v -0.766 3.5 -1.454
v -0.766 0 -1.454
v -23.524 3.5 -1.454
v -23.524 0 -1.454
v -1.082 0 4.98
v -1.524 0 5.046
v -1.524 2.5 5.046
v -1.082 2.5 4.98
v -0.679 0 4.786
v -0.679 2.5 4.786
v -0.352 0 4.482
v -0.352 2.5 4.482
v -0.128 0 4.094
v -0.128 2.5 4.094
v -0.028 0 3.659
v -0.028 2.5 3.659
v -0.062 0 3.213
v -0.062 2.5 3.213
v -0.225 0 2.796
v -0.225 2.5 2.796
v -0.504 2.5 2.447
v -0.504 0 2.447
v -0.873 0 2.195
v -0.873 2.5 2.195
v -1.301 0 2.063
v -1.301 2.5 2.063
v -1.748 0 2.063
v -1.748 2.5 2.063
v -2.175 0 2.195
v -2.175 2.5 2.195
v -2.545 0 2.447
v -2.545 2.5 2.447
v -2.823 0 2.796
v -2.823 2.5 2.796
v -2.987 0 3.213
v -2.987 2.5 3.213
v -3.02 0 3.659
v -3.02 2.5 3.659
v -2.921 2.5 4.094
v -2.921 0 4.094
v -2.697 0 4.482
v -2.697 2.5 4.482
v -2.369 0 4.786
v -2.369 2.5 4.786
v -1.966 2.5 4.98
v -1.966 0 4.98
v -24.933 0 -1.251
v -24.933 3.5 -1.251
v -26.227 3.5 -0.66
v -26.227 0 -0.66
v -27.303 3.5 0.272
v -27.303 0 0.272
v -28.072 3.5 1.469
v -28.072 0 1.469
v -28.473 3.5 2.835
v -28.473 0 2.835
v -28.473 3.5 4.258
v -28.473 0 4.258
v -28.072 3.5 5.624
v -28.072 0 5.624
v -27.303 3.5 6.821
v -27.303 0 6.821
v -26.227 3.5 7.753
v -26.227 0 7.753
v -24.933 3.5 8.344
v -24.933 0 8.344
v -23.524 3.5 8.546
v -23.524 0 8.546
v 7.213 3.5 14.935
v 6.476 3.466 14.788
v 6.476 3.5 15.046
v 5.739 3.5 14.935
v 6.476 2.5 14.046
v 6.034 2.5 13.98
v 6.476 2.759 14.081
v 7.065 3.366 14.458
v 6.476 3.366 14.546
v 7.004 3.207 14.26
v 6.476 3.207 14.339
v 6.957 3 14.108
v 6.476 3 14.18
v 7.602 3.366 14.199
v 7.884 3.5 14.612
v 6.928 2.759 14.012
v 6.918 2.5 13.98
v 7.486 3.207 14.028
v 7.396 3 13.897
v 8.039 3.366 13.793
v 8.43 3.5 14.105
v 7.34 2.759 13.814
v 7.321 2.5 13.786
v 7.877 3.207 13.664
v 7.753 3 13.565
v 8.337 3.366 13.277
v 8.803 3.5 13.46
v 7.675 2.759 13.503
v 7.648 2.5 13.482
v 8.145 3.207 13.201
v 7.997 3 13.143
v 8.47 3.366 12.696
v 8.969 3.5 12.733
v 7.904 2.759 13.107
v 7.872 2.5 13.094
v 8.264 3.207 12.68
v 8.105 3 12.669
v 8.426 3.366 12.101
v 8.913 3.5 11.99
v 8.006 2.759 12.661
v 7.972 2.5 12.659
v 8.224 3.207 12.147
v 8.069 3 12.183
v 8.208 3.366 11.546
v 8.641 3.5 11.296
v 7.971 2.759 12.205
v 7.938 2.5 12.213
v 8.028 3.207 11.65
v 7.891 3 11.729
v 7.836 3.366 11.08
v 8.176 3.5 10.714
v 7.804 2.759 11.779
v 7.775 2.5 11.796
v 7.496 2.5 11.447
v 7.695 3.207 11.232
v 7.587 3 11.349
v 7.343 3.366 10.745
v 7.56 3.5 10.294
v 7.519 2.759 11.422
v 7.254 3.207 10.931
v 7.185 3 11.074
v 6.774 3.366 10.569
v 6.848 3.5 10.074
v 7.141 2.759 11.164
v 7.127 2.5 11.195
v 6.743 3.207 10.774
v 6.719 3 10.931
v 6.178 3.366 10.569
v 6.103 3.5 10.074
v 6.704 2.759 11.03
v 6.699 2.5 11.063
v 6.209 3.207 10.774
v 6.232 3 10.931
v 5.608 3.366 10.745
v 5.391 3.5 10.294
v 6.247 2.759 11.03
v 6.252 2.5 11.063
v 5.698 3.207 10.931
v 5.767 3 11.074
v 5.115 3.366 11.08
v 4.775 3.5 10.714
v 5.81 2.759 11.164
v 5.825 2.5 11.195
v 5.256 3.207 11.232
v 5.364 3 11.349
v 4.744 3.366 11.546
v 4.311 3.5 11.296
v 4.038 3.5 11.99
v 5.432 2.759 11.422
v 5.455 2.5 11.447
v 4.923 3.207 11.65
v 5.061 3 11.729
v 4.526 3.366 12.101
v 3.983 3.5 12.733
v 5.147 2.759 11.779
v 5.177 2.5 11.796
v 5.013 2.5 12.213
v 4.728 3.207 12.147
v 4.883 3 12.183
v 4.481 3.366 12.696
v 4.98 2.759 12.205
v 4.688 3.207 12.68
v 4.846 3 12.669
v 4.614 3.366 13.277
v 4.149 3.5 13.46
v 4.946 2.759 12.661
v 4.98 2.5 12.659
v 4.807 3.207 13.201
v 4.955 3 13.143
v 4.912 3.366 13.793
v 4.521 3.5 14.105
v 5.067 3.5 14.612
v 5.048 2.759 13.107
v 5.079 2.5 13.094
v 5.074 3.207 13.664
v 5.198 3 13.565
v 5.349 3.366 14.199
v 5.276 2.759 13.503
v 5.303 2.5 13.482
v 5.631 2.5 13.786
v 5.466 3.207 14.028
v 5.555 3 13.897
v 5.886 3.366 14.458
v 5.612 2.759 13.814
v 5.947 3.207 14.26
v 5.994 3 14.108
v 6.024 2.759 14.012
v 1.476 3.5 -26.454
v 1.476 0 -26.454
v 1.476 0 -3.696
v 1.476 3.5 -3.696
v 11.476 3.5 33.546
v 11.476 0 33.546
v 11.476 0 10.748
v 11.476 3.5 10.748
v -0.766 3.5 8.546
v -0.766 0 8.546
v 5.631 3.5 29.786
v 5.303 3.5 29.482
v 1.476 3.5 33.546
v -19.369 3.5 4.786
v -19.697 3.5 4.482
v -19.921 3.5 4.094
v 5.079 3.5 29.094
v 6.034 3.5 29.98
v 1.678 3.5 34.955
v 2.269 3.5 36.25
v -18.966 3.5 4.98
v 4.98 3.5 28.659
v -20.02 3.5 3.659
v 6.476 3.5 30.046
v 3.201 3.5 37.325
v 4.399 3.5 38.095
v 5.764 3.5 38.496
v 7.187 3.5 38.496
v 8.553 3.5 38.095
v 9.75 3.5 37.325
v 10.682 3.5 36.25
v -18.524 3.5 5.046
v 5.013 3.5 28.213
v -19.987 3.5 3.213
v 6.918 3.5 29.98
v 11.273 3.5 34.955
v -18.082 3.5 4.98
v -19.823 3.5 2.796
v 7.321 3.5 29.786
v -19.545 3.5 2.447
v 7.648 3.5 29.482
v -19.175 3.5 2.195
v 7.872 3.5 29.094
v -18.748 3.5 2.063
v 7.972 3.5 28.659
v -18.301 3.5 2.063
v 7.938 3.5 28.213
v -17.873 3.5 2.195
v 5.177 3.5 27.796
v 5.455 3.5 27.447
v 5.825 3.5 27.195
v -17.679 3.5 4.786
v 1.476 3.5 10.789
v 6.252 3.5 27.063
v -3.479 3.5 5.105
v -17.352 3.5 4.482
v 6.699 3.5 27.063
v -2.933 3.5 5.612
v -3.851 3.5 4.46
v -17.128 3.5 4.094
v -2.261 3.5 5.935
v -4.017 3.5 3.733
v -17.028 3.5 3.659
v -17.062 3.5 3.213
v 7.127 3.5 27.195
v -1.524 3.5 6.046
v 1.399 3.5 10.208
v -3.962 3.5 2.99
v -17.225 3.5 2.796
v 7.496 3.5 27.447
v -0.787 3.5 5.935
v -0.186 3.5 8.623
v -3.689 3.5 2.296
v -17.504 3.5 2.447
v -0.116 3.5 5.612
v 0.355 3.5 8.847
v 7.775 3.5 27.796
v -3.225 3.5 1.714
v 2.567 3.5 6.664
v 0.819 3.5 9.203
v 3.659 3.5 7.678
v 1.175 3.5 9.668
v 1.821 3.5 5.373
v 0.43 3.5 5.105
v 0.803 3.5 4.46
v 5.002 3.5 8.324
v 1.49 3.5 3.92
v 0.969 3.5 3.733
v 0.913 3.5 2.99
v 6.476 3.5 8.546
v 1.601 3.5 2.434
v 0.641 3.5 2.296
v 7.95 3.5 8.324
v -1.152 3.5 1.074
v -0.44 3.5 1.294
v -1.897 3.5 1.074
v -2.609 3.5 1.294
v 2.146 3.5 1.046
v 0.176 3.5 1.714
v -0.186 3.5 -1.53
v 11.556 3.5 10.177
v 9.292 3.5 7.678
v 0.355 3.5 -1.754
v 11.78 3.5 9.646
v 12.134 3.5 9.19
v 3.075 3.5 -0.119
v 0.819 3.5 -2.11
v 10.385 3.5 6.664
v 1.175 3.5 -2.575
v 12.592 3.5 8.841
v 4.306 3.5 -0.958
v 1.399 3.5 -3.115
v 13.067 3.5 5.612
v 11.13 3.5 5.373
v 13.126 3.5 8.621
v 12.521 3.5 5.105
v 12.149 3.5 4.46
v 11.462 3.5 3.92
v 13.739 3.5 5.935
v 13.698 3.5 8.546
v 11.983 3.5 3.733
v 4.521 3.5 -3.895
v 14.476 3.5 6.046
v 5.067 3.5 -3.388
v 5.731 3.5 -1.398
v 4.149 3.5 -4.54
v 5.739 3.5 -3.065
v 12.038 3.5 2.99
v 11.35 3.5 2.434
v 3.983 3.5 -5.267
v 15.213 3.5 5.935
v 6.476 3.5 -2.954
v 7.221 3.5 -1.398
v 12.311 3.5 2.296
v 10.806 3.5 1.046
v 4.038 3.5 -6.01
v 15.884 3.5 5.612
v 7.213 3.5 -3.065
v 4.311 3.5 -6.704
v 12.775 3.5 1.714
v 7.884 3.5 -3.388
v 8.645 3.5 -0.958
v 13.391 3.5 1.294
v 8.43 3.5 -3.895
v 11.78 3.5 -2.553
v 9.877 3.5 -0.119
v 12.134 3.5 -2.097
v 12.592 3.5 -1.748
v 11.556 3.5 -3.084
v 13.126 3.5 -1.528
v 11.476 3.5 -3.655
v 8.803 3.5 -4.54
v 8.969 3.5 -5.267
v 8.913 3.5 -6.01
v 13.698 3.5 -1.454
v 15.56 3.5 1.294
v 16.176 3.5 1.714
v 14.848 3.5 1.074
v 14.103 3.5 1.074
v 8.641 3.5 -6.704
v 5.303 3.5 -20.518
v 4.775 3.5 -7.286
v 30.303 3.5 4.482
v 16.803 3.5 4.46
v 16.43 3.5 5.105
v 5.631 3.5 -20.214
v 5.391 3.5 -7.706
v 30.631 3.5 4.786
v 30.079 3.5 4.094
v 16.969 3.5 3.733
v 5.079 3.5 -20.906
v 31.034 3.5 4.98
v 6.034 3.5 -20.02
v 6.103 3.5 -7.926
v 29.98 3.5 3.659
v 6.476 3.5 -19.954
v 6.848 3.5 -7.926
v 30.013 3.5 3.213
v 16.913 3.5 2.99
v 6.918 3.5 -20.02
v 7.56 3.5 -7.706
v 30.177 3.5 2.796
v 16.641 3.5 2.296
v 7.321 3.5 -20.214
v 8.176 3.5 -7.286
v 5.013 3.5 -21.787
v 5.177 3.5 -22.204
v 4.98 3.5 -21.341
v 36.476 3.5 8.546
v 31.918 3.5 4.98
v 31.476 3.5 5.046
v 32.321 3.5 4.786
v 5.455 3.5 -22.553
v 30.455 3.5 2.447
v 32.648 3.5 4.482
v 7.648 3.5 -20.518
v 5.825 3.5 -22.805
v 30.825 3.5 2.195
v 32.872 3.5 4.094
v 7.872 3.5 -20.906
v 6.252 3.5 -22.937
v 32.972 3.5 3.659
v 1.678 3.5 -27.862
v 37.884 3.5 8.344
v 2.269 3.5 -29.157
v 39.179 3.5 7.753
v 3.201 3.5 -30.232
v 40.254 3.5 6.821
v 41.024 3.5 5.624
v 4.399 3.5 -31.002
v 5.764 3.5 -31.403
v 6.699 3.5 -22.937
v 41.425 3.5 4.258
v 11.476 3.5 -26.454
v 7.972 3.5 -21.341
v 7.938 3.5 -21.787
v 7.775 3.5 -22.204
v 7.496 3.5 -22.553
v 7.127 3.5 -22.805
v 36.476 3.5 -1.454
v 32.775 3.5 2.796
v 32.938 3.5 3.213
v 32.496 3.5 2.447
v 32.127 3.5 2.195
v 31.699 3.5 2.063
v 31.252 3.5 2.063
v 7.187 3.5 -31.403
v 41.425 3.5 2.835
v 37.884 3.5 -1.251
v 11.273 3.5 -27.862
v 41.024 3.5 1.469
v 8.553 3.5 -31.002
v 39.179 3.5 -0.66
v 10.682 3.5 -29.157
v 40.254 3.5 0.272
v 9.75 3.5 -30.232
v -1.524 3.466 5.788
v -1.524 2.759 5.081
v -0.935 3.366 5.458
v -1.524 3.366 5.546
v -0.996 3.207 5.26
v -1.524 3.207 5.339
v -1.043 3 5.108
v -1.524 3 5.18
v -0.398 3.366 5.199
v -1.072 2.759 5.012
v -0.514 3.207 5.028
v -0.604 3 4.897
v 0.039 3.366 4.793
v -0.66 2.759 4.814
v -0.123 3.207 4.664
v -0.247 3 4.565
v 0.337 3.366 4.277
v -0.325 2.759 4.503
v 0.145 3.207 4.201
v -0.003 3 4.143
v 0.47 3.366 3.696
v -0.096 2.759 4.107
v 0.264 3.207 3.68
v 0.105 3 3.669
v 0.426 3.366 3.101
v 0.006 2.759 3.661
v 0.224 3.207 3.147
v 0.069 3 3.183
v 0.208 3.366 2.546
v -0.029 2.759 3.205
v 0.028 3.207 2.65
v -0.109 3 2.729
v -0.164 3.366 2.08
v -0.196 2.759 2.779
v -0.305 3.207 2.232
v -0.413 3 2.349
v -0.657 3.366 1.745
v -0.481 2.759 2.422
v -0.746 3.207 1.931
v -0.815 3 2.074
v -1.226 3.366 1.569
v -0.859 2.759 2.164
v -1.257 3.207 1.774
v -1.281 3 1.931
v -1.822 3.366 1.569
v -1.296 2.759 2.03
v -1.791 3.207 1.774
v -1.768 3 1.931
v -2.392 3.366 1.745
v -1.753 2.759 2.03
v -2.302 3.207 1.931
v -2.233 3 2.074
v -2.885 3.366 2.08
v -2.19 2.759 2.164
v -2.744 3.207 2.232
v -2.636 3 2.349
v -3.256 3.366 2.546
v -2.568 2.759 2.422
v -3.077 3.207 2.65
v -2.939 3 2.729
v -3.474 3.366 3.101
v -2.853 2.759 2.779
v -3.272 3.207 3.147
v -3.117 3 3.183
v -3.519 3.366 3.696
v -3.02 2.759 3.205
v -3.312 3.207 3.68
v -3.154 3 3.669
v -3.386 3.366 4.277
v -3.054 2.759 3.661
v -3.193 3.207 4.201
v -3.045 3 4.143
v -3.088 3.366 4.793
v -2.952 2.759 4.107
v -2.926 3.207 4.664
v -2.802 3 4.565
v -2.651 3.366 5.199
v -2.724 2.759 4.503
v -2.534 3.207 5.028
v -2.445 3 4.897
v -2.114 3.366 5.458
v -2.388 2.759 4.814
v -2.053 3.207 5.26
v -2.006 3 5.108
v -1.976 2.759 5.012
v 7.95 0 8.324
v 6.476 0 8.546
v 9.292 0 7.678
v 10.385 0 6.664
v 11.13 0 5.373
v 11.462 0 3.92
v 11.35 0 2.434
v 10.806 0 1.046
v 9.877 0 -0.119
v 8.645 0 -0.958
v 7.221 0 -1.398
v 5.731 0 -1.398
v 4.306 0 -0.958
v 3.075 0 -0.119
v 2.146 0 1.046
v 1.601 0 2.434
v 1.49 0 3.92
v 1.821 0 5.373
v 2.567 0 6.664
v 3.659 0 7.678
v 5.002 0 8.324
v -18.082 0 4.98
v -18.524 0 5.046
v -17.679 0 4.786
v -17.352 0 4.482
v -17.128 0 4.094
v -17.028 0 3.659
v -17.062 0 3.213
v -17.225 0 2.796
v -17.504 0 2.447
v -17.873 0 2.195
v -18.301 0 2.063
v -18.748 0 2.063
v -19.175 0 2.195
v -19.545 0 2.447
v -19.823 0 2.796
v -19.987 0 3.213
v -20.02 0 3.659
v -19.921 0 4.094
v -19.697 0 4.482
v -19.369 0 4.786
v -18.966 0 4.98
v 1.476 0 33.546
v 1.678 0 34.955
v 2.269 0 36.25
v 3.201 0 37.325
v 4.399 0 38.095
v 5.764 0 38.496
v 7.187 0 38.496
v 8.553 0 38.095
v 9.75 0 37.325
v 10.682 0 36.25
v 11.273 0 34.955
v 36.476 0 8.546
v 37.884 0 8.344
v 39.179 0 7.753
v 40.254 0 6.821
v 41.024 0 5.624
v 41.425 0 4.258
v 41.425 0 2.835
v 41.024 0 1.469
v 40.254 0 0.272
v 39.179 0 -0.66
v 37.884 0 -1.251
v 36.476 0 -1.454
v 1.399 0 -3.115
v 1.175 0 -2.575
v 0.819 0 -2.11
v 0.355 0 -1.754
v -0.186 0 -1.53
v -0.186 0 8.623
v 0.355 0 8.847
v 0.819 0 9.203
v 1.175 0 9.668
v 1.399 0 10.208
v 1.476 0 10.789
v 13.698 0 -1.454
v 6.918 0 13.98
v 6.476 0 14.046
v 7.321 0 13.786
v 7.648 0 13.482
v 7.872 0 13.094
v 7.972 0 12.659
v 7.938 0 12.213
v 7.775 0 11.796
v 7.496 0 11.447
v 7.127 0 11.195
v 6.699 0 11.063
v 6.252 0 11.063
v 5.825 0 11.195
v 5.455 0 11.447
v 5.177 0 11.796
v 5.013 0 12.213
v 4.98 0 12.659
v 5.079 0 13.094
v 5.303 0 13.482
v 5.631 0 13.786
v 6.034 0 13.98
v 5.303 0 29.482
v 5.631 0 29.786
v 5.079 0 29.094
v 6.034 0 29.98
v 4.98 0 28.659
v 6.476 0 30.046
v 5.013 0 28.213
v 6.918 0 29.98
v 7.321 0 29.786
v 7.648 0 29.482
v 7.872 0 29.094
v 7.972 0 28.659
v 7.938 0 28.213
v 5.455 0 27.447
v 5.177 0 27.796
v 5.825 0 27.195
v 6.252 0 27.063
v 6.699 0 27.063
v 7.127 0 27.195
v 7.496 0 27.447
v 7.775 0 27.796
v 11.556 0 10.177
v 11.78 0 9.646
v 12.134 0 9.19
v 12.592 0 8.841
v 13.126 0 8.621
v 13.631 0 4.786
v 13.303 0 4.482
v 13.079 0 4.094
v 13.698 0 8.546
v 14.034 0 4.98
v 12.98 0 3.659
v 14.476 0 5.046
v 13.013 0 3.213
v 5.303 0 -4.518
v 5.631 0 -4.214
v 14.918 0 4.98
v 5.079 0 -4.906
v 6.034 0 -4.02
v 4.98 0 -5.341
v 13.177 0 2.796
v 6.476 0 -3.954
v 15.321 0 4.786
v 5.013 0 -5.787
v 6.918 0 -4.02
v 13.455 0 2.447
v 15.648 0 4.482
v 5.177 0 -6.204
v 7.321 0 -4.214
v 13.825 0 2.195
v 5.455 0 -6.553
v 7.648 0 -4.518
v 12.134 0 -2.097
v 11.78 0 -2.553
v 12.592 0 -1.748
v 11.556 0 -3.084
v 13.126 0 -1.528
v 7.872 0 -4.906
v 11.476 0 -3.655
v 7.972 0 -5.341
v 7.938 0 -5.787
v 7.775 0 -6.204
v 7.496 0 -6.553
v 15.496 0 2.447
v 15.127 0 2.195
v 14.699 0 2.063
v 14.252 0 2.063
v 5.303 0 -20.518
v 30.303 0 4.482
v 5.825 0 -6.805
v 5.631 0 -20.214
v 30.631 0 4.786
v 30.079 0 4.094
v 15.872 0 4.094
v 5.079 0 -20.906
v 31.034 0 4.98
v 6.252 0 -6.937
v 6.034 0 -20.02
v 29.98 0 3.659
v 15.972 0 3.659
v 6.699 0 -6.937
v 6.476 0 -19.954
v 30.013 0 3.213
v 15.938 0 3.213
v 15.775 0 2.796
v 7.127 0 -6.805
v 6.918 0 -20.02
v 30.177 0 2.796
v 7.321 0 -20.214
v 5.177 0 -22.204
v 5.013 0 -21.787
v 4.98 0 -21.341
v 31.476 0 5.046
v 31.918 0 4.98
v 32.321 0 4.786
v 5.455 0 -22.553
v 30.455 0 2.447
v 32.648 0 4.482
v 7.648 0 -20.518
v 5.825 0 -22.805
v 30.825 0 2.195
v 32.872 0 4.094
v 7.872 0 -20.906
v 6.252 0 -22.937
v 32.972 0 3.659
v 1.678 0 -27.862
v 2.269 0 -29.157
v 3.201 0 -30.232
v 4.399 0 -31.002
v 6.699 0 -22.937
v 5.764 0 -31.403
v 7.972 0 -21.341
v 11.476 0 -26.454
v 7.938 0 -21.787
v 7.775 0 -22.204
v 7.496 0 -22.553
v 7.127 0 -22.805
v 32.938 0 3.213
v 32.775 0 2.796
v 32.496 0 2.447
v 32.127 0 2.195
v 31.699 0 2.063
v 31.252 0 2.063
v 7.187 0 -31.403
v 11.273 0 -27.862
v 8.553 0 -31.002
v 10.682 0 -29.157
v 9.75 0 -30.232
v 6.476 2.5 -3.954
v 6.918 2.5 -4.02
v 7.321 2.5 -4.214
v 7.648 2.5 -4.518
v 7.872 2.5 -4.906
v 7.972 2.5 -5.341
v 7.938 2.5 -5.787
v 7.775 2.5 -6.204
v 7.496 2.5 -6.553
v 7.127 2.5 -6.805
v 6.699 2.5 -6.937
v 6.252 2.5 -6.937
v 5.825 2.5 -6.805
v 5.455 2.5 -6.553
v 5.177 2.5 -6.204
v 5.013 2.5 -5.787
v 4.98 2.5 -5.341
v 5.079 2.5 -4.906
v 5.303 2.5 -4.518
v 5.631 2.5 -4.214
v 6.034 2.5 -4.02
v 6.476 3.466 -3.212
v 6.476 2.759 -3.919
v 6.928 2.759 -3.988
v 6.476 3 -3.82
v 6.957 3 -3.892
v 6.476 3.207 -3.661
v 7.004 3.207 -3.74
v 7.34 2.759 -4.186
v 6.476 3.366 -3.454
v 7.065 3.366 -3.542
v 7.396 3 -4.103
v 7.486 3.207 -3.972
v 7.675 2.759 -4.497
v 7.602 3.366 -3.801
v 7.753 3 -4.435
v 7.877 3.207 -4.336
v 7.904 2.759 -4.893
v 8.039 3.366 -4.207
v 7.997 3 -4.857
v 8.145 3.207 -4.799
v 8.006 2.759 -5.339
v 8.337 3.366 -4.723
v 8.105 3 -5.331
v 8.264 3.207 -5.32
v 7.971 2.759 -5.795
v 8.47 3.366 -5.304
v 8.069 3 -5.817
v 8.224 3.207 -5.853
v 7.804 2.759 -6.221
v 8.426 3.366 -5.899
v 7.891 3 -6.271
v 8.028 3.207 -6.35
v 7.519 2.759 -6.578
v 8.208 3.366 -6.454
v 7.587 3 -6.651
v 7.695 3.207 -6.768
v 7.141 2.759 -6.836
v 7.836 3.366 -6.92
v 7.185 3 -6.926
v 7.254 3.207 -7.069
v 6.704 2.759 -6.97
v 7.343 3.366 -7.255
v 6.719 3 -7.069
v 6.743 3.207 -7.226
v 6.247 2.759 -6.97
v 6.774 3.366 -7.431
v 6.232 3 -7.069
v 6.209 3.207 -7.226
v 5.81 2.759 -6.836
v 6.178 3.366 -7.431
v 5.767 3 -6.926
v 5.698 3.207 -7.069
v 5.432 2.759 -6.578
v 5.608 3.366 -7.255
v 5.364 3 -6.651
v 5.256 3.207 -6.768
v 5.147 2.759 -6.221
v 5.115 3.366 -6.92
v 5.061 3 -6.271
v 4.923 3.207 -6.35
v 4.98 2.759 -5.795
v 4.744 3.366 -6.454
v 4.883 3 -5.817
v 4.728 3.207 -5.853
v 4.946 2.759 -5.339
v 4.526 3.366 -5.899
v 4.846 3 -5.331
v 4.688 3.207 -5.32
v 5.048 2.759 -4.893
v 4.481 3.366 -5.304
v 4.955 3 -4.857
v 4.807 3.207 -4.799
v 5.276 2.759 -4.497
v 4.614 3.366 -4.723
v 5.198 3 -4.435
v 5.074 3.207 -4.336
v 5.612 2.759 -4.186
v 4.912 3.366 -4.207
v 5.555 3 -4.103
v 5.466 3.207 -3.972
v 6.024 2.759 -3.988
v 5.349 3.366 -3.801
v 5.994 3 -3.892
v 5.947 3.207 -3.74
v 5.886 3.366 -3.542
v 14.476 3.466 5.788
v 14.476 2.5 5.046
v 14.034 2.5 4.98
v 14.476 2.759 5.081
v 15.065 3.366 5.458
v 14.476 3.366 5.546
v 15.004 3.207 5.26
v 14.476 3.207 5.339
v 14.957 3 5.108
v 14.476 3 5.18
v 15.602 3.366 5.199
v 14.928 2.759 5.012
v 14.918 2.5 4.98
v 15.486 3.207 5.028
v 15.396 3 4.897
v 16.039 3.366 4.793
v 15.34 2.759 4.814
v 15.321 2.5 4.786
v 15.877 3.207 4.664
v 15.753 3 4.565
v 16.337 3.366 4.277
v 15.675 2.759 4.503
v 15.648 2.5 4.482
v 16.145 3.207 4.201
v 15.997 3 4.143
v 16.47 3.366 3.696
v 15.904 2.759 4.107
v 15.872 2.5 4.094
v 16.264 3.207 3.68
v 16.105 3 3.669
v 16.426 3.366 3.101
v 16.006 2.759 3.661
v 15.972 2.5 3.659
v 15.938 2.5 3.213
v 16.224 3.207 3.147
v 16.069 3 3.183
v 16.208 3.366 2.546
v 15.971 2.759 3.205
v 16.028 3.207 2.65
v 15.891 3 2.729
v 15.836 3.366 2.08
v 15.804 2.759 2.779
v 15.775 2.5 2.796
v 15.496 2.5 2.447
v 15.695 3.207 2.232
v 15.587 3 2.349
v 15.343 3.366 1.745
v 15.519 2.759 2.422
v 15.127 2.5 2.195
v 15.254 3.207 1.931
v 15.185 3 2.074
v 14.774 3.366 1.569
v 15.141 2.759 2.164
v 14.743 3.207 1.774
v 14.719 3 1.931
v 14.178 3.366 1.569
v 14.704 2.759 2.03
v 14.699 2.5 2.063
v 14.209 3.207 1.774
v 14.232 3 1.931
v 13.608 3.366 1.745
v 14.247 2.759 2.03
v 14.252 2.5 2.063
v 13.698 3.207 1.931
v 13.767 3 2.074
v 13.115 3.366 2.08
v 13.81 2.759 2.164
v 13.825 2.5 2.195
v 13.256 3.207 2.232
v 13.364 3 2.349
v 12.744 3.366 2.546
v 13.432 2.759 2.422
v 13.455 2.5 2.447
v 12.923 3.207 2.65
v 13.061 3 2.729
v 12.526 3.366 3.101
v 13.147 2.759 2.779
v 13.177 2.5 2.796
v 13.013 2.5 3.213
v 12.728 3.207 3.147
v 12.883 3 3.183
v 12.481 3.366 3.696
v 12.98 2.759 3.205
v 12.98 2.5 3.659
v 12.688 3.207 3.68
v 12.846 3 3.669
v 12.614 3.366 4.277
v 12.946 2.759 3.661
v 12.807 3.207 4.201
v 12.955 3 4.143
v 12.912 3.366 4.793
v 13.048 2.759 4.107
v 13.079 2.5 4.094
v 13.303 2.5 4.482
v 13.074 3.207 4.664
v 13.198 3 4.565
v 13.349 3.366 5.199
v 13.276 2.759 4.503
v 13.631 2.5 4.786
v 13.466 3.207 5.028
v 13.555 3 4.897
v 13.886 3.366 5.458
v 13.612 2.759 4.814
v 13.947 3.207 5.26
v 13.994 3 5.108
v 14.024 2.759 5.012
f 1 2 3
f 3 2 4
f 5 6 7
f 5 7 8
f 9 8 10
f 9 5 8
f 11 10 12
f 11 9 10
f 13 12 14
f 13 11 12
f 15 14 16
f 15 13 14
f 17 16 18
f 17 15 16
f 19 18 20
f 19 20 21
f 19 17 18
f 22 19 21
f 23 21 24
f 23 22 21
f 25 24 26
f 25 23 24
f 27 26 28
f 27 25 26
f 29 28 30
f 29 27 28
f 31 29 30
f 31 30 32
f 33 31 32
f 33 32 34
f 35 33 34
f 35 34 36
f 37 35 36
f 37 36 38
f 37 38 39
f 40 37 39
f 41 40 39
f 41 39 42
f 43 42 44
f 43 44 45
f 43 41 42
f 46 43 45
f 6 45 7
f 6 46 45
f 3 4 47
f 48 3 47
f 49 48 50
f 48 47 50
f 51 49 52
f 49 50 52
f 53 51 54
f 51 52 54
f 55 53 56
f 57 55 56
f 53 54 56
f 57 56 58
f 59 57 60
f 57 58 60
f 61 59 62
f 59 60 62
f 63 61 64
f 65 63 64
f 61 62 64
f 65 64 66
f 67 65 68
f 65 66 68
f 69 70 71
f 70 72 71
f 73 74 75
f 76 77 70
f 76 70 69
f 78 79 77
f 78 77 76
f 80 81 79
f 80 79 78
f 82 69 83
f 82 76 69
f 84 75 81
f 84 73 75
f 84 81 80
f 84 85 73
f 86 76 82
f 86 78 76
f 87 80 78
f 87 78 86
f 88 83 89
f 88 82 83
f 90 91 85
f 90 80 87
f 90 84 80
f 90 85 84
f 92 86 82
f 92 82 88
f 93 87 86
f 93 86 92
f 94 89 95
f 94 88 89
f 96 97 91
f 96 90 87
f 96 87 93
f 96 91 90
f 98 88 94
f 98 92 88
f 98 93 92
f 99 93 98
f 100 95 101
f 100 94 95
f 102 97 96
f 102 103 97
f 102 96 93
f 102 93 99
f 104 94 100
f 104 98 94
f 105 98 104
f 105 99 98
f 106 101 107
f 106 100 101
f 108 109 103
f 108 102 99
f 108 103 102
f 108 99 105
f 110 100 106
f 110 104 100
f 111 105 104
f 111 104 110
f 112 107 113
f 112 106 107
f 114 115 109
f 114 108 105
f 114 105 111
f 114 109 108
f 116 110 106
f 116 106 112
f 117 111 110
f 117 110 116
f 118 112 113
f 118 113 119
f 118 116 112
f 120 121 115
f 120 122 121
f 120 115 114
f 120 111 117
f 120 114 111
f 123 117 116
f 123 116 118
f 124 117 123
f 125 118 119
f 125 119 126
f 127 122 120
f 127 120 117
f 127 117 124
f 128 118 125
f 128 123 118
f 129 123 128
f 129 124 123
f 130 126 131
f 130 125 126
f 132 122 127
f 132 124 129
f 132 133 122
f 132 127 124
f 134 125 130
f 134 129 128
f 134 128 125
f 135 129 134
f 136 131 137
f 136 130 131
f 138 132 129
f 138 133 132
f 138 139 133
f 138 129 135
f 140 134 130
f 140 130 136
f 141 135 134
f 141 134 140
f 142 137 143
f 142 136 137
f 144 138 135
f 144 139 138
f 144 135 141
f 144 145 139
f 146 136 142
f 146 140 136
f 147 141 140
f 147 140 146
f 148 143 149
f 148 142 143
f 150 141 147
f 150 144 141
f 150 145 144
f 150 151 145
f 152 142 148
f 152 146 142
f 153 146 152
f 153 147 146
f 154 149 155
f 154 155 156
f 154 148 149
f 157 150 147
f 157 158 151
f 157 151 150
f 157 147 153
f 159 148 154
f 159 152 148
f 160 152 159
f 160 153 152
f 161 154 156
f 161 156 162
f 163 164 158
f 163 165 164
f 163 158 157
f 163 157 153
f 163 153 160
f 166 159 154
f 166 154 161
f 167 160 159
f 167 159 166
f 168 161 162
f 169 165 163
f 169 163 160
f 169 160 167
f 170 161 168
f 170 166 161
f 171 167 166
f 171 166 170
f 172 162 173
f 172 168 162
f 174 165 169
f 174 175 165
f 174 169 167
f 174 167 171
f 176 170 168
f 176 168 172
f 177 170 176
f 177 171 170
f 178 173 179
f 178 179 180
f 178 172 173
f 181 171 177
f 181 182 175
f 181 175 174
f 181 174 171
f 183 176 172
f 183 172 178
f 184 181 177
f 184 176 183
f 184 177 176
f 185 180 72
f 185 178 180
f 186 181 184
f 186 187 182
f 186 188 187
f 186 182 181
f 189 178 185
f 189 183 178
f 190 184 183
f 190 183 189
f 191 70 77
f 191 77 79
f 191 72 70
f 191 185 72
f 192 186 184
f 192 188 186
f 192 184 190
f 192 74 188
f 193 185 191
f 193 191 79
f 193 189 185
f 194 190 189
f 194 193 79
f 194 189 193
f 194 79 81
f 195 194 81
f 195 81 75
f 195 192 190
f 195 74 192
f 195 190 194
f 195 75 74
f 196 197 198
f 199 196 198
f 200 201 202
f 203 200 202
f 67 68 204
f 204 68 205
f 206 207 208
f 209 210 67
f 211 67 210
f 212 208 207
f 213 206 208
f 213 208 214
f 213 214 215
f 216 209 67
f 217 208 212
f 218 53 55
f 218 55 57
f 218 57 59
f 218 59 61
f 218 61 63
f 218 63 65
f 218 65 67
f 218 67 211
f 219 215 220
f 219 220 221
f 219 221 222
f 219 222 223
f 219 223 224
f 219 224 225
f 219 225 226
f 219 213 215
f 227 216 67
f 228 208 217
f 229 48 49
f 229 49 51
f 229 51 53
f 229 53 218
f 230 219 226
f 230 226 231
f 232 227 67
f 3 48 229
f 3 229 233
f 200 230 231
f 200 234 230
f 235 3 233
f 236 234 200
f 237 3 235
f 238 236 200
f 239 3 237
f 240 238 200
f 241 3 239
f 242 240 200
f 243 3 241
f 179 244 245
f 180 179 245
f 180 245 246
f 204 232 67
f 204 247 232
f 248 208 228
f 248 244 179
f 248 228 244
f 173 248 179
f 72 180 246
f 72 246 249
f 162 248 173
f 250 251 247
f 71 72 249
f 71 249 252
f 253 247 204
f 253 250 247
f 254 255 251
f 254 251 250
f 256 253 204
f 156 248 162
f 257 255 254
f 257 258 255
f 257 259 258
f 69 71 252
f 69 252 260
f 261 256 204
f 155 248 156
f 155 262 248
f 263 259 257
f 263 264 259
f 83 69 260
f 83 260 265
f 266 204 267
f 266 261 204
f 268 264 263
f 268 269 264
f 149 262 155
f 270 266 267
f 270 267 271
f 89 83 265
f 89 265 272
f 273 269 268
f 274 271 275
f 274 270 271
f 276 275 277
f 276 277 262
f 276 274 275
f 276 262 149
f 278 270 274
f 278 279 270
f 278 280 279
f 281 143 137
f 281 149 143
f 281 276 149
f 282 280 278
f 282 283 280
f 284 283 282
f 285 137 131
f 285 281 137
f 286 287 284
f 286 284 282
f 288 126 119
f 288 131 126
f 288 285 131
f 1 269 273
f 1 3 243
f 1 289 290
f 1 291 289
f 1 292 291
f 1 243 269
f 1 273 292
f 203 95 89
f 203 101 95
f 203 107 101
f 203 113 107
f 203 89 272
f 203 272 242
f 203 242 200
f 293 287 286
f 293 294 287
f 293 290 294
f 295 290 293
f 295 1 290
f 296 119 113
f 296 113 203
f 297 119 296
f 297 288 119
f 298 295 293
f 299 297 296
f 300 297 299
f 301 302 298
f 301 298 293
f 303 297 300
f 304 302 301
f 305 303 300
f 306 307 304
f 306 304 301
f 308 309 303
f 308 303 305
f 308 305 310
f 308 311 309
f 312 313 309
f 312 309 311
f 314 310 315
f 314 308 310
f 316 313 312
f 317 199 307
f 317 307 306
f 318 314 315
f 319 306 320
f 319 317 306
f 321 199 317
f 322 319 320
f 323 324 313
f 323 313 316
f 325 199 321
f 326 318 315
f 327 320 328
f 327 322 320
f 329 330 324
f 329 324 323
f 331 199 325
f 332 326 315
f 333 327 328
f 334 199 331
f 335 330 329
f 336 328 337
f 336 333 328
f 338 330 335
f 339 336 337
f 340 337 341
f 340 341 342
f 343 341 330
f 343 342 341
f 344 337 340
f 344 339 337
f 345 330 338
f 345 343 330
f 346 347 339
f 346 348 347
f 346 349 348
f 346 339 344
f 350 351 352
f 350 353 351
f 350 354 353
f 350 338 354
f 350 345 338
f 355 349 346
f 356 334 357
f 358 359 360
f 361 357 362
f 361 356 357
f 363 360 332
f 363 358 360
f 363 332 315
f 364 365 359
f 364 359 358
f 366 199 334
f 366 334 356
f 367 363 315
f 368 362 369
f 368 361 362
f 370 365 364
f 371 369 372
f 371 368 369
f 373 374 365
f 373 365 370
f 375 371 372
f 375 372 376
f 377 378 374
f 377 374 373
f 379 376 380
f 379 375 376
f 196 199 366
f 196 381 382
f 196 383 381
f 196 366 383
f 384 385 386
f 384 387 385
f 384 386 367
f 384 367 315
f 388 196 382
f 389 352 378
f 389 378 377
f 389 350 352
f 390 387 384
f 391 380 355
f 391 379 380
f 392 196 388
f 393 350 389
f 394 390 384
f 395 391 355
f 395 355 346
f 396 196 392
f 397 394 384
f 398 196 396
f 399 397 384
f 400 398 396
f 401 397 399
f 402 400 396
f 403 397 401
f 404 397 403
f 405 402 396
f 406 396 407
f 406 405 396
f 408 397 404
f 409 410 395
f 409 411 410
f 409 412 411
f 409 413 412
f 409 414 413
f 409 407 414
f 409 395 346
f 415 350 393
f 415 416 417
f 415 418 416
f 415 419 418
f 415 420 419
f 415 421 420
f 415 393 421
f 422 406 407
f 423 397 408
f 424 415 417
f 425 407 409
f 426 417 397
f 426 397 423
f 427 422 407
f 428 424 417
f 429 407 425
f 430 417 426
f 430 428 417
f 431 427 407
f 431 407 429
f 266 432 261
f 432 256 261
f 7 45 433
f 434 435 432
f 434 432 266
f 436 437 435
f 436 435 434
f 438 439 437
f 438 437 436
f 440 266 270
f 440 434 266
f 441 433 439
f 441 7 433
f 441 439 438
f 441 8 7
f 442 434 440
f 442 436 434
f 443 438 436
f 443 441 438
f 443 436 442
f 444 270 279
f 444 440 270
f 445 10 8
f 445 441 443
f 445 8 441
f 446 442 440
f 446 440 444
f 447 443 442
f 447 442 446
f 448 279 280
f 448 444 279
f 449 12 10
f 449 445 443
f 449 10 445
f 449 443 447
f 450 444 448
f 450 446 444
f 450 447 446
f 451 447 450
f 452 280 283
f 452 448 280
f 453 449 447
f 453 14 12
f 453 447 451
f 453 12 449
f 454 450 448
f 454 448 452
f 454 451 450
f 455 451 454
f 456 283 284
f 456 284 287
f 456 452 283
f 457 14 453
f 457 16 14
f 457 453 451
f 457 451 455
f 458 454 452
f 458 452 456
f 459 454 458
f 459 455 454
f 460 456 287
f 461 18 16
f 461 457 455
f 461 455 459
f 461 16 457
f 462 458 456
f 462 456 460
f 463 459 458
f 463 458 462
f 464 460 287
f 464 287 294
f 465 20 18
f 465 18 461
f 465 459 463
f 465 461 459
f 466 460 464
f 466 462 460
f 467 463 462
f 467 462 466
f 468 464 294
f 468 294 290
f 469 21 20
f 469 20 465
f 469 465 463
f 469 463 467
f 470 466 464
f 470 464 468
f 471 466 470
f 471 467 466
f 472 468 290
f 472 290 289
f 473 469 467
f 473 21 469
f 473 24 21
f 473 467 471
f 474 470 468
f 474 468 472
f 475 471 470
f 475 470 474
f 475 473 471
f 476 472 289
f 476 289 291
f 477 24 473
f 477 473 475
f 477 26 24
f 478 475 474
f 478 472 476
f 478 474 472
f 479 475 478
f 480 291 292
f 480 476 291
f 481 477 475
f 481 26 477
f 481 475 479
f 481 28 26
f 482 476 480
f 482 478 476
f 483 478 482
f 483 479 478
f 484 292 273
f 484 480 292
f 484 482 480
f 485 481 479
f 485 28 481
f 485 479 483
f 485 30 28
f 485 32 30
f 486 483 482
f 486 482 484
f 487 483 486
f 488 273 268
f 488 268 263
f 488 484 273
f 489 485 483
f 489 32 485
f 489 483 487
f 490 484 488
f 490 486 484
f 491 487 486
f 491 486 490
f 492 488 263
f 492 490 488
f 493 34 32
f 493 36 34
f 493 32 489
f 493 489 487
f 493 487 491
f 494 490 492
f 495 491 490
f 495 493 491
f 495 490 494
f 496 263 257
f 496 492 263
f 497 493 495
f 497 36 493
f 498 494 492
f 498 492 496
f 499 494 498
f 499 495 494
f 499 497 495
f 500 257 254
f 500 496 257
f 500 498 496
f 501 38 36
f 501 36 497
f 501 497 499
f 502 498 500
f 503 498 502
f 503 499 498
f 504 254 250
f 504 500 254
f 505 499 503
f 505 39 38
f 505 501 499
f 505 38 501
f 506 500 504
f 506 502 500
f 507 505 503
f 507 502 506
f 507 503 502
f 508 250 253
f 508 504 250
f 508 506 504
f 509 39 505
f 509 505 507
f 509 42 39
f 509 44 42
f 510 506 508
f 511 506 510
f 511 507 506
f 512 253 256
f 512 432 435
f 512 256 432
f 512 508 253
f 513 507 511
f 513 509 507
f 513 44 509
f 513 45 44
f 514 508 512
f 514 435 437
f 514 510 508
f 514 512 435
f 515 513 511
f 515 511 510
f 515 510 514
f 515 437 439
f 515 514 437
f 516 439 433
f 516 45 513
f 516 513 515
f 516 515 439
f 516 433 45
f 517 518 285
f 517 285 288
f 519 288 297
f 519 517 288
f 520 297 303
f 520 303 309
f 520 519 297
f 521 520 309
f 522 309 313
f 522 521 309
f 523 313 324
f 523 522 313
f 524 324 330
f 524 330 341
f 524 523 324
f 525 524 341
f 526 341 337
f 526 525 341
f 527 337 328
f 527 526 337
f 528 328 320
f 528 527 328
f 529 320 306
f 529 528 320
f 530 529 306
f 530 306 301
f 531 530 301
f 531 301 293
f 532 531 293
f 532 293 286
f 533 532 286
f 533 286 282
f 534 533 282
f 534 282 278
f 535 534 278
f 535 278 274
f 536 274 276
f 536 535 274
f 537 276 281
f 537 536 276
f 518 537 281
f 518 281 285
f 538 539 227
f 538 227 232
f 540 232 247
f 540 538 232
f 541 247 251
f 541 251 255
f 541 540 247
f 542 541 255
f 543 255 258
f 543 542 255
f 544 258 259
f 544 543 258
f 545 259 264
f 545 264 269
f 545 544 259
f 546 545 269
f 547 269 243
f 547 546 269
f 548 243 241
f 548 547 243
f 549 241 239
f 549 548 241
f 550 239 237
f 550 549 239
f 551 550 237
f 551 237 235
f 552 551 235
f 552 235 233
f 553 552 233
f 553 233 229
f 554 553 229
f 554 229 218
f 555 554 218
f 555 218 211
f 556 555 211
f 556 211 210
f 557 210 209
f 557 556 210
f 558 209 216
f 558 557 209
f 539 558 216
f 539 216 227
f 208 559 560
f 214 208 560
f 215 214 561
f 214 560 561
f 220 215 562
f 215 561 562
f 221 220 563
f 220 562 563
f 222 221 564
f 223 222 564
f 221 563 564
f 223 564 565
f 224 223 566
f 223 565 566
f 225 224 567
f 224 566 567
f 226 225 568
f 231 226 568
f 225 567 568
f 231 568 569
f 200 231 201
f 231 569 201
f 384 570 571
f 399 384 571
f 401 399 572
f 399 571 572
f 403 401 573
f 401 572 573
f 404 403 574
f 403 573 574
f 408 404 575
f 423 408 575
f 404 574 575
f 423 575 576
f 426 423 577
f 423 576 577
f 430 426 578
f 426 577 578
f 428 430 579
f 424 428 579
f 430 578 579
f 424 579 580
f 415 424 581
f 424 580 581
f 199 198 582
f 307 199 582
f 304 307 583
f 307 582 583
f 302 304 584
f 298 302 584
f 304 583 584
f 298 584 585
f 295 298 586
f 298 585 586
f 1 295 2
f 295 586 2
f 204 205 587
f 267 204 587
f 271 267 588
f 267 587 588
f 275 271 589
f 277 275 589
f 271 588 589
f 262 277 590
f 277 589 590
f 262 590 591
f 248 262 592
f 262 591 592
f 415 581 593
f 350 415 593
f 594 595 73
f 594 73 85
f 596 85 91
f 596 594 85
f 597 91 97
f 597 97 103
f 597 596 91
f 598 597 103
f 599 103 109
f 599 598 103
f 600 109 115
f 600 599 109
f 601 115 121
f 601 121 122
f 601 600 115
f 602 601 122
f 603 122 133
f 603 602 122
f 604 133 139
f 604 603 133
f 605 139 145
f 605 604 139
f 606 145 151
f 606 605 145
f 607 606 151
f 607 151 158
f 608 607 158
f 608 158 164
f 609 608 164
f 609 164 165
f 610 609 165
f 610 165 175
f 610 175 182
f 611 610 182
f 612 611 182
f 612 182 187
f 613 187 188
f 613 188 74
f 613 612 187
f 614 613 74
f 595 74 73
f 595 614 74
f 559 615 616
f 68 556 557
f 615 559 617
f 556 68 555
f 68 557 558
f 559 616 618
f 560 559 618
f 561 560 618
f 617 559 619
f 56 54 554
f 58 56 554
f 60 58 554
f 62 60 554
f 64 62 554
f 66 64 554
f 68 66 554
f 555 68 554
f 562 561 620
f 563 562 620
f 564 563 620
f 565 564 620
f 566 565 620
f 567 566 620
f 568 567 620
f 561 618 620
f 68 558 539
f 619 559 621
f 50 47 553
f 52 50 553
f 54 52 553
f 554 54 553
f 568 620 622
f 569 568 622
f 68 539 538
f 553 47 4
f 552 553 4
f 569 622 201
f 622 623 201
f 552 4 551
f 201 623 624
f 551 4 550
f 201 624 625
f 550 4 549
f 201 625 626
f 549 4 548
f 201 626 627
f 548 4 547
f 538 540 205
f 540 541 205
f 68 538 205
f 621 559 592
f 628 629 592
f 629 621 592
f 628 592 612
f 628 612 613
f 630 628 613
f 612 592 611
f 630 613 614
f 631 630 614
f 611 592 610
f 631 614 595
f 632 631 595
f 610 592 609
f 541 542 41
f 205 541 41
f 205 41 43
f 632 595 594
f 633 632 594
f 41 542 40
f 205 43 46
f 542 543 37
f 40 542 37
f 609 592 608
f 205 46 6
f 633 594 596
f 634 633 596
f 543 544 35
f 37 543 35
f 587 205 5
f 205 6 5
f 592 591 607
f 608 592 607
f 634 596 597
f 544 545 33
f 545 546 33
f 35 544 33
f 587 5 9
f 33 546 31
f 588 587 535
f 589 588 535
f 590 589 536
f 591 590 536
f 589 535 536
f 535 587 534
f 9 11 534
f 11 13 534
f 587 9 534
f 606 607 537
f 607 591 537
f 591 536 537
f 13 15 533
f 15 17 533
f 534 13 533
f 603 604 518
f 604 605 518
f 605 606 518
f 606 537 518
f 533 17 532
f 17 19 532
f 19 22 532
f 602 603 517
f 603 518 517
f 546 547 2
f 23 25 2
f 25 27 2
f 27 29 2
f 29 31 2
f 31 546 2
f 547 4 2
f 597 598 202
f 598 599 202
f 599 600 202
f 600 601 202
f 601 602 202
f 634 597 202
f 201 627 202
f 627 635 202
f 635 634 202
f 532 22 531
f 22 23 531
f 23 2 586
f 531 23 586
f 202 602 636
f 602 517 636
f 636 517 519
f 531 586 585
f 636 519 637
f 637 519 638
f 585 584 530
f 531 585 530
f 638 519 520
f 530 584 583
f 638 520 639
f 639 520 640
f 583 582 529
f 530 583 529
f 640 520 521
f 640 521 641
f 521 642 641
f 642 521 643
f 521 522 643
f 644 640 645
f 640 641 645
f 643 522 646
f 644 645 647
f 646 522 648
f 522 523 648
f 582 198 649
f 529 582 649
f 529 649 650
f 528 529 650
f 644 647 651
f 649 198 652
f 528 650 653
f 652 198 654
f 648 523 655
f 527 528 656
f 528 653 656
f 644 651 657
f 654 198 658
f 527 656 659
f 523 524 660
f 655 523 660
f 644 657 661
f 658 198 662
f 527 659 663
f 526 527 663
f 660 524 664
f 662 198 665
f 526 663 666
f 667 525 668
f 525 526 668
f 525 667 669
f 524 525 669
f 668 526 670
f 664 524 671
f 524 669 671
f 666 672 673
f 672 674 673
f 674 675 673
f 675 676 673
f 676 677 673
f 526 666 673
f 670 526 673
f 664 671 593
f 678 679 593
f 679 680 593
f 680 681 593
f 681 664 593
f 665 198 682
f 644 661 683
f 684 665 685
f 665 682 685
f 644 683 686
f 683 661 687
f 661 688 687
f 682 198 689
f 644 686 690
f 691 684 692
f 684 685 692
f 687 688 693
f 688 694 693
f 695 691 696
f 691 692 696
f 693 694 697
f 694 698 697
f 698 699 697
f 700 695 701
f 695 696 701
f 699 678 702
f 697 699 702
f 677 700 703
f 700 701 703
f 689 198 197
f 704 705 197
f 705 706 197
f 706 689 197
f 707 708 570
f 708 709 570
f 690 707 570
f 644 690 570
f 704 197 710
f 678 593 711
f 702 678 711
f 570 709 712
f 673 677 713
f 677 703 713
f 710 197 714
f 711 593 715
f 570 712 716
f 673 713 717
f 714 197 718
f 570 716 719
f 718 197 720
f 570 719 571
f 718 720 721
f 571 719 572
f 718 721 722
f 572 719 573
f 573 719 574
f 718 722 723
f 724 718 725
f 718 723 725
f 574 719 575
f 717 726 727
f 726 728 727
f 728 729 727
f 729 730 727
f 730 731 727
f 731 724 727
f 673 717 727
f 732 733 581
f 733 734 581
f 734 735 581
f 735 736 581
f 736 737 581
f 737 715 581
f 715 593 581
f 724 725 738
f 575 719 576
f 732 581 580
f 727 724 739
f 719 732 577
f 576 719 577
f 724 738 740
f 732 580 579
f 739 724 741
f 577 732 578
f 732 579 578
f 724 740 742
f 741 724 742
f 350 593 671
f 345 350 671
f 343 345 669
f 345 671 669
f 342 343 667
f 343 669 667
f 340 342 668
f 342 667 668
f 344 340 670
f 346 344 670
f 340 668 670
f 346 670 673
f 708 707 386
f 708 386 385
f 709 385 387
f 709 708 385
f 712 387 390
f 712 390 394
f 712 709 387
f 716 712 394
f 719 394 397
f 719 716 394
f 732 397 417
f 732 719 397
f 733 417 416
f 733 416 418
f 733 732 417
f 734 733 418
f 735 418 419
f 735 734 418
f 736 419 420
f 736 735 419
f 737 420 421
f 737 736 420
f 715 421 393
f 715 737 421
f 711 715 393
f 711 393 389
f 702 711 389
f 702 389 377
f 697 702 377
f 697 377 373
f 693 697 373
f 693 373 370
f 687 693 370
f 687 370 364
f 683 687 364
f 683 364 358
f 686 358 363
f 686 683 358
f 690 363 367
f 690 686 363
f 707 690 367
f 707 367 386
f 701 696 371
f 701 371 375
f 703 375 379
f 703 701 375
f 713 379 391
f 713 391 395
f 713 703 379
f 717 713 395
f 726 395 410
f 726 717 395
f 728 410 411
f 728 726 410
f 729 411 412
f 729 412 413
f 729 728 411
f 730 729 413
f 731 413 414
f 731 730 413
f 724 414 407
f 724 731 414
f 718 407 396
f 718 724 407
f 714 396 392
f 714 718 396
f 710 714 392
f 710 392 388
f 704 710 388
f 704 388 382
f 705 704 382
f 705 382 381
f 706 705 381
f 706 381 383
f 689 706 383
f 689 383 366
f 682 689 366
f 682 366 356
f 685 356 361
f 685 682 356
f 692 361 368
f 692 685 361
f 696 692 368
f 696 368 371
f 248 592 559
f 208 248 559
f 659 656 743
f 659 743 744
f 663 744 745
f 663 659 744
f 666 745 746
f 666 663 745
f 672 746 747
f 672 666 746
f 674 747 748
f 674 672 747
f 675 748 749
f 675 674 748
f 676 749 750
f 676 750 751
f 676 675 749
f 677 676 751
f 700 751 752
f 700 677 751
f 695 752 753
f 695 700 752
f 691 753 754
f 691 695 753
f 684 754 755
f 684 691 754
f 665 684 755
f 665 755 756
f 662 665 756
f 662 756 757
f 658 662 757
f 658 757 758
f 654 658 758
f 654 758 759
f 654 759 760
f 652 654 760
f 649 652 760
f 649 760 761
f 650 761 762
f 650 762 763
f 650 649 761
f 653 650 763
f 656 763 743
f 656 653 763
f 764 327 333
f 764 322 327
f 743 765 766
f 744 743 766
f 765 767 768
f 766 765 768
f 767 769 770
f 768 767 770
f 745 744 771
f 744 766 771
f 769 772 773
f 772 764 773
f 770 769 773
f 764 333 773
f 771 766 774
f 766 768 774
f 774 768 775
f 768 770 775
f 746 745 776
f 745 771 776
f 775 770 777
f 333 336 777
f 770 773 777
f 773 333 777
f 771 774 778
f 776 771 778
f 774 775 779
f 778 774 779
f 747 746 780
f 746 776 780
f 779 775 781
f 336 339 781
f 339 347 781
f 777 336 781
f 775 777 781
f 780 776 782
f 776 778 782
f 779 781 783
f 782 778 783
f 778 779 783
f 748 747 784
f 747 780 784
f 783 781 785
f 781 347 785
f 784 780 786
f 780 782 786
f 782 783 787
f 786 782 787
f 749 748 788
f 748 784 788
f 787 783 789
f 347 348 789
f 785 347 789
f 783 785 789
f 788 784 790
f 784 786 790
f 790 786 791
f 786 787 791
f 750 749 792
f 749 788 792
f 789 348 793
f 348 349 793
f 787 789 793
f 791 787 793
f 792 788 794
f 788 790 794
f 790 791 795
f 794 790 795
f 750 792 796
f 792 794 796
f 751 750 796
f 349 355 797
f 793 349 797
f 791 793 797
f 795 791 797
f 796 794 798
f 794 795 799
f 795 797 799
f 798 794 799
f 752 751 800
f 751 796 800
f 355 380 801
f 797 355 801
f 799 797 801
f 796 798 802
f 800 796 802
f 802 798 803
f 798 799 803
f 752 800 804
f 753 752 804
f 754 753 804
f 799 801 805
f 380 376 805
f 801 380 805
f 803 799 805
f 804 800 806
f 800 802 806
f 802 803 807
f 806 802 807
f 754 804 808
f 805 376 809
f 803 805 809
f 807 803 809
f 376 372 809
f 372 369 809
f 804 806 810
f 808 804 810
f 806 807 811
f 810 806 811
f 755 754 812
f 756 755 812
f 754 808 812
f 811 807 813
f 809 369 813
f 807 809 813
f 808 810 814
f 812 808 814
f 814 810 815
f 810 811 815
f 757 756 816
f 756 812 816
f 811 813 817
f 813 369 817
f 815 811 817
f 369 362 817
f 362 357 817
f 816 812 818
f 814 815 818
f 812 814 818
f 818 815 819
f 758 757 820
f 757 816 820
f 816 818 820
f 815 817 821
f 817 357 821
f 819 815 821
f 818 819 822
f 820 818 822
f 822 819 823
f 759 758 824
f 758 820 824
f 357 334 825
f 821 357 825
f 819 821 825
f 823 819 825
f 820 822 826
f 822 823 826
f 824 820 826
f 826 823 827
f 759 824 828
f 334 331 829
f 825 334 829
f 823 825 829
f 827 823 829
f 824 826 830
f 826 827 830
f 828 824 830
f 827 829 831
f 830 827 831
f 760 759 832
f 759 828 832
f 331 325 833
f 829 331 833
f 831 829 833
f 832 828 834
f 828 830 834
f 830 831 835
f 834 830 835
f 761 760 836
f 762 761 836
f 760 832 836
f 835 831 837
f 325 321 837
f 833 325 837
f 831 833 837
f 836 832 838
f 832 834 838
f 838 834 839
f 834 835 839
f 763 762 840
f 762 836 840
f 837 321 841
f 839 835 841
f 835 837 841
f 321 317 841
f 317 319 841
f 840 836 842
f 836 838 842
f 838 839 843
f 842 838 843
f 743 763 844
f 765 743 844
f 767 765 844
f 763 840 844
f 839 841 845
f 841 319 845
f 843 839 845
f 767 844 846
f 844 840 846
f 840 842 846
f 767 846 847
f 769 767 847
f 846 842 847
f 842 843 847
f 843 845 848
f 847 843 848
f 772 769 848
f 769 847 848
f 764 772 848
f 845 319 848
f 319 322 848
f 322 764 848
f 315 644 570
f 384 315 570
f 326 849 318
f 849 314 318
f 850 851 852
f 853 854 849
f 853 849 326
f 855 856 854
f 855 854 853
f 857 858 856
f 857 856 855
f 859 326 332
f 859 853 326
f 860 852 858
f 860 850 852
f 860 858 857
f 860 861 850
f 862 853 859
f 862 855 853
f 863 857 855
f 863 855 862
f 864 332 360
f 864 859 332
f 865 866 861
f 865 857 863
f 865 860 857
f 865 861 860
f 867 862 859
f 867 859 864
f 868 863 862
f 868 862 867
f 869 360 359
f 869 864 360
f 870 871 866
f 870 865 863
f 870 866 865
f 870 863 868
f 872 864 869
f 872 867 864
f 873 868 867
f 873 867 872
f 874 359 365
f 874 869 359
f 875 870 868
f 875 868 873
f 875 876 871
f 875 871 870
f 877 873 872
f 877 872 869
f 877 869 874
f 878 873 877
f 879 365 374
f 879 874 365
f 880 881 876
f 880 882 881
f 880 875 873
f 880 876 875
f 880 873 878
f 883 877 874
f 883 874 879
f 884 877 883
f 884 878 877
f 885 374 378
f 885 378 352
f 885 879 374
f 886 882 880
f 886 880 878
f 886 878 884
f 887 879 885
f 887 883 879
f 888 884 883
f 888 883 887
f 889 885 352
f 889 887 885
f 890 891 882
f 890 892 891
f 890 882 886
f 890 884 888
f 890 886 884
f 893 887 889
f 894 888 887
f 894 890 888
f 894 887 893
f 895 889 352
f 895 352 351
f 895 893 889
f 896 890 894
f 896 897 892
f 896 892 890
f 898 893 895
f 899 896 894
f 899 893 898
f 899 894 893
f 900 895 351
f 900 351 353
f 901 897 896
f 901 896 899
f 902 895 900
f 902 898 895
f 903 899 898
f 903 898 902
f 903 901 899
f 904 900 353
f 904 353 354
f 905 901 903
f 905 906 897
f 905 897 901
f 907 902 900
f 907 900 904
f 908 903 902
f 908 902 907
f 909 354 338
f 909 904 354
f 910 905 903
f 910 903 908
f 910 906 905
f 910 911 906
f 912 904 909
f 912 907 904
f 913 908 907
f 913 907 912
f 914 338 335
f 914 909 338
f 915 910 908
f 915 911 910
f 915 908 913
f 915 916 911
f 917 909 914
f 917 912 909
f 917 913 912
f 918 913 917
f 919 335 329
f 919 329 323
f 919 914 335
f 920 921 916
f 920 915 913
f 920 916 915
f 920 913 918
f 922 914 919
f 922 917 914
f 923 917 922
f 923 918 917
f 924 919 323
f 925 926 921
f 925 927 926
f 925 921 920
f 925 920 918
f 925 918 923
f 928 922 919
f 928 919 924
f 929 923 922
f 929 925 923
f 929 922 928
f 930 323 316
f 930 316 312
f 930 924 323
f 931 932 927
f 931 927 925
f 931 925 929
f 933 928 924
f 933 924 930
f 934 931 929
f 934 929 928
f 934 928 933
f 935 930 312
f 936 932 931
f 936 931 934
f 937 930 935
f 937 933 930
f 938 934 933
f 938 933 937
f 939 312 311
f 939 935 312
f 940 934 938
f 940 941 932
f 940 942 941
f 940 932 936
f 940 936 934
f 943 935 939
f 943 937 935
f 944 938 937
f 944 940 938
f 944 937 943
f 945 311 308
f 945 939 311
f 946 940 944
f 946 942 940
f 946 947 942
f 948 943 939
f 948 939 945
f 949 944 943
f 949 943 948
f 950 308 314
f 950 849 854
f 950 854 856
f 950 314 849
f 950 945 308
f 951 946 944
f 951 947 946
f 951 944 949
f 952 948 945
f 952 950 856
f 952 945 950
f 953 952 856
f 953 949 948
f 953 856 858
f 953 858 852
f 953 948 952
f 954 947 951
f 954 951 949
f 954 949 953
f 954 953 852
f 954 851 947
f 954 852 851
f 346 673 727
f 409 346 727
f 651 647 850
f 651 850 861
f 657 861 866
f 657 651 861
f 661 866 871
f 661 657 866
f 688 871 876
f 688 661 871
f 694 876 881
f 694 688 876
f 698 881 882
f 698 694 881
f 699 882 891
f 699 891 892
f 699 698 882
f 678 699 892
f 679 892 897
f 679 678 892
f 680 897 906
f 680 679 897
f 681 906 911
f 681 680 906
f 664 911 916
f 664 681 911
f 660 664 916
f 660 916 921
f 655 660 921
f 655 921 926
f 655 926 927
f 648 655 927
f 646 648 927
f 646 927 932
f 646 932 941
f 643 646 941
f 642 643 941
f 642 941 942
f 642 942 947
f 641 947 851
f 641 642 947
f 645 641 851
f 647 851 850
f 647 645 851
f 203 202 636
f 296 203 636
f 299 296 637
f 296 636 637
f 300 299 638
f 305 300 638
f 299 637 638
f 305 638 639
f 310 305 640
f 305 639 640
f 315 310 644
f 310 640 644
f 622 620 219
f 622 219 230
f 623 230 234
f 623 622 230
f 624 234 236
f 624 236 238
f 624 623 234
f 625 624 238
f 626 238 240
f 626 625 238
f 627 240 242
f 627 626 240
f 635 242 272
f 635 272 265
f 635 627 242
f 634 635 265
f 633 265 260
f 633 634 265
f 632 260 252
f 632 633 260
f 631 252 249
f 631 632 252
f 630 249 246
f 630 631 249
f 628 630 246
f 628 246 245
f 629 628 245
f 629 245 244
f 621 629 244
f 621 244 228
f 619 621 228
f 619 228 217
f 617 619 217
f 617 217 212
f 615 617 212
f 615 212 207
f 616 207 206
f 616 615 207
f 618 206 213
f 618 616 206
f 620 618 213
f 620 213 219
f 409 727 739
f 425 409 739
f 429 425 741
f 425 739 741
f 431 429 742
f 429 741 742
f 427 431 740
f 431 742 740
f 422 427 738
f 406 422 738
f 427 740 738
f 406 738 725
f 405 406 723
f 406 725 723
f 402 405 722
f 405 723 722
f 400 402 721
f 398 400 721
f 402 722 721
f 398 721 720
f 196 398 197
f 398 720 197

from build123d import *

# Parameters (mm, degrees)
CROQUIS1_R              = 1.5
CROQUIS1_R_2            = 5
SALIENTE_EXTRUIR2_DEPTH = 3.5
REDONDEO9_R             = 1
REDONDEO10_R            = 1
REDONDEO11_R            = 1
REDONDEO12_R            = 1


with BuildPart() as part:
    # Croquis1 → Saliente-Extruir2 (new body)
    with BuildSketch(Plane(origin=(0, 0, 0), x_dir=(1, 0, 0), z_dir=(0, 1, 0))):
        with BuildLine():
            Line((1.47572532, 11.484579709), (1.47572532, 3.695762793))
            ThreePointArc((1.47572532, 3.695762793), (0.818994747, 2.110274939), (-0.766493108, 1.453544366))
            Line((-0.766493108, 1.453544366), (-23.52427468, 1.453544366))
            ThreePointArc((-23.52427468, 1.453544366), (-28.52427468, -3.546455634), (-23.52427468, -8.546455634))
            Line((-23.52427468, -8.546455634), (-0.766493108, -8.546455634))
            ThreePointArc((-0.766493108, -8.546455634), (0.818994747, -9.203186206), (1.47572532, -10.788674061))
            Line((1.47572532, -10.788674061), (1.47572532, -18.577490976))
            Line((1.47572532, -18.577490976), (1.47572532, -33.546455634))
            ThreePointArc((1.47572532, -33.546455634), (6.47572532, -38.546455634), (11.47572532, -33.546455634))
            Line((11.47572532, -33.546455634), (11.47572532, -10.788674061))
            Line((11.47572532, -10.788674061), (11.47572532, -10.748363891))
            ThreePointArc((11.47572532, -10.748363891), (12.133603326, -9.190173106), (13.697697252, -8.546455634))
            Line((13.697697252, -8.546455634), (36.47572532, -8.546455634))
            ThreePointArc((36.47572532, -8.546455634), (41.47572532, -3.546455634), (36.47572532, 1.453544366))
            Line((36.47572532, 1.453544366), (13.697697252, 1.453544366))
            ThreePointArc((13.697697252, 1.453544366), (12.133603326, 2.097261838), (11.47572532, 3.655452623))
            Line((11.47572532, 3.655452623), (11.47572532, 3.695762793))
            Line((11.47572532, 3.695762793), (11.47572532, 26.453544366))
            ThreePointArc((11.47572532, 26.453544366), (6.47572532, 31.453544366), (1.47572532, 26.453544366))
            Line((1.47572532, 26.453544366), (1.47572532, 11.484579709))
        make_face()
        with Locations(Location((-1.52427468, -3.546455634, 0), (0, 0, 270))):
            Circle(CROQUIS1_R, mode=Mode.SUBTRACT)
        with Locations(Location((6.47572532, -28.546455634, 0), (0, 0, 270))):
            Circle(CROQUIS1_R, mode=Mode.SUBTRACT)
        with Locations(Location((6.47572532, -12.546455634, 0), (0, 0, 270))):
            Circle(CROQUIS1_R, mode=Mode.SUBTRACT)
        with Locations(Location((-18.52427468, -3.546455634, 0), (0, 0, 270))):
            Circle(CROQUIS1_R, mode=Mode.SUBTRACT)
        with Locations(Location((6.47572532, -3.546455634, 0), (0, 0, 270))):
            Circle(CROQUIS1_R_2, mode=Mode.SUBTRACT)
        with Locations(Location((14.47572532, -3.546455634, 0), (0, 0, 270))):
            Circle(CROQUIS1_R, mode=Mode.SUBTRACT)
        with Locations(Location((6.47572532, 5.453544366, 0), (0, 0, 270))):
            Circle(CROQUIS1_R, mode=Mode.SUBTRACT)
        with Locations(Location((31.47572532, -3.546455634, 0), (0, 0, 270))):
            Circle(CROQUIS1_R, mode=Mode.SUBTRACT)
        with Locations(Location((6.47572532, 21.453544366, 0), (0, 0, 270))):
            Circle(CROQUIS1_R, mode=Mode.SUBTRACT)
    extrude(amount=SALIENTE_EXTRUIR2_DEPTH)

    # Redondeo9
    redondeo9_edges = [part.edges().sort_by_distance(p)[0] for p in [
        (6.47572532, 3.5, -6.953544366),
    ]]
    fillet(redondeo9_edges, radius=REDONDEO9_R)

    # Redondeo10
    redondeo10_edges = [part.edges().sort_by_distance(p)[0] for p in [
        (14.47572532, 3.5, 2.046455634),
    ]]
    fillet(redondeo10_edges, radius=REDONDEO10_R)

    # Redondeo11
    redondeo11_edges = [part.edges().sort_by_distance(p)[0] for p in [
        (6.47572532, 3.5, 11.046455634),
    ]]
    fillet(redondeo11_edges, radius=REDONDEO11_R)

    # Redondeo12
    redondeo12_edges = [part.edges().sort_by_distance(p)[0] for p in [
        (-1.52427468, 3.5, 2.046455634),
    ]]
    fillet(redondeo12_edges, radius=REDONDEO12_R)


solid = part.part
